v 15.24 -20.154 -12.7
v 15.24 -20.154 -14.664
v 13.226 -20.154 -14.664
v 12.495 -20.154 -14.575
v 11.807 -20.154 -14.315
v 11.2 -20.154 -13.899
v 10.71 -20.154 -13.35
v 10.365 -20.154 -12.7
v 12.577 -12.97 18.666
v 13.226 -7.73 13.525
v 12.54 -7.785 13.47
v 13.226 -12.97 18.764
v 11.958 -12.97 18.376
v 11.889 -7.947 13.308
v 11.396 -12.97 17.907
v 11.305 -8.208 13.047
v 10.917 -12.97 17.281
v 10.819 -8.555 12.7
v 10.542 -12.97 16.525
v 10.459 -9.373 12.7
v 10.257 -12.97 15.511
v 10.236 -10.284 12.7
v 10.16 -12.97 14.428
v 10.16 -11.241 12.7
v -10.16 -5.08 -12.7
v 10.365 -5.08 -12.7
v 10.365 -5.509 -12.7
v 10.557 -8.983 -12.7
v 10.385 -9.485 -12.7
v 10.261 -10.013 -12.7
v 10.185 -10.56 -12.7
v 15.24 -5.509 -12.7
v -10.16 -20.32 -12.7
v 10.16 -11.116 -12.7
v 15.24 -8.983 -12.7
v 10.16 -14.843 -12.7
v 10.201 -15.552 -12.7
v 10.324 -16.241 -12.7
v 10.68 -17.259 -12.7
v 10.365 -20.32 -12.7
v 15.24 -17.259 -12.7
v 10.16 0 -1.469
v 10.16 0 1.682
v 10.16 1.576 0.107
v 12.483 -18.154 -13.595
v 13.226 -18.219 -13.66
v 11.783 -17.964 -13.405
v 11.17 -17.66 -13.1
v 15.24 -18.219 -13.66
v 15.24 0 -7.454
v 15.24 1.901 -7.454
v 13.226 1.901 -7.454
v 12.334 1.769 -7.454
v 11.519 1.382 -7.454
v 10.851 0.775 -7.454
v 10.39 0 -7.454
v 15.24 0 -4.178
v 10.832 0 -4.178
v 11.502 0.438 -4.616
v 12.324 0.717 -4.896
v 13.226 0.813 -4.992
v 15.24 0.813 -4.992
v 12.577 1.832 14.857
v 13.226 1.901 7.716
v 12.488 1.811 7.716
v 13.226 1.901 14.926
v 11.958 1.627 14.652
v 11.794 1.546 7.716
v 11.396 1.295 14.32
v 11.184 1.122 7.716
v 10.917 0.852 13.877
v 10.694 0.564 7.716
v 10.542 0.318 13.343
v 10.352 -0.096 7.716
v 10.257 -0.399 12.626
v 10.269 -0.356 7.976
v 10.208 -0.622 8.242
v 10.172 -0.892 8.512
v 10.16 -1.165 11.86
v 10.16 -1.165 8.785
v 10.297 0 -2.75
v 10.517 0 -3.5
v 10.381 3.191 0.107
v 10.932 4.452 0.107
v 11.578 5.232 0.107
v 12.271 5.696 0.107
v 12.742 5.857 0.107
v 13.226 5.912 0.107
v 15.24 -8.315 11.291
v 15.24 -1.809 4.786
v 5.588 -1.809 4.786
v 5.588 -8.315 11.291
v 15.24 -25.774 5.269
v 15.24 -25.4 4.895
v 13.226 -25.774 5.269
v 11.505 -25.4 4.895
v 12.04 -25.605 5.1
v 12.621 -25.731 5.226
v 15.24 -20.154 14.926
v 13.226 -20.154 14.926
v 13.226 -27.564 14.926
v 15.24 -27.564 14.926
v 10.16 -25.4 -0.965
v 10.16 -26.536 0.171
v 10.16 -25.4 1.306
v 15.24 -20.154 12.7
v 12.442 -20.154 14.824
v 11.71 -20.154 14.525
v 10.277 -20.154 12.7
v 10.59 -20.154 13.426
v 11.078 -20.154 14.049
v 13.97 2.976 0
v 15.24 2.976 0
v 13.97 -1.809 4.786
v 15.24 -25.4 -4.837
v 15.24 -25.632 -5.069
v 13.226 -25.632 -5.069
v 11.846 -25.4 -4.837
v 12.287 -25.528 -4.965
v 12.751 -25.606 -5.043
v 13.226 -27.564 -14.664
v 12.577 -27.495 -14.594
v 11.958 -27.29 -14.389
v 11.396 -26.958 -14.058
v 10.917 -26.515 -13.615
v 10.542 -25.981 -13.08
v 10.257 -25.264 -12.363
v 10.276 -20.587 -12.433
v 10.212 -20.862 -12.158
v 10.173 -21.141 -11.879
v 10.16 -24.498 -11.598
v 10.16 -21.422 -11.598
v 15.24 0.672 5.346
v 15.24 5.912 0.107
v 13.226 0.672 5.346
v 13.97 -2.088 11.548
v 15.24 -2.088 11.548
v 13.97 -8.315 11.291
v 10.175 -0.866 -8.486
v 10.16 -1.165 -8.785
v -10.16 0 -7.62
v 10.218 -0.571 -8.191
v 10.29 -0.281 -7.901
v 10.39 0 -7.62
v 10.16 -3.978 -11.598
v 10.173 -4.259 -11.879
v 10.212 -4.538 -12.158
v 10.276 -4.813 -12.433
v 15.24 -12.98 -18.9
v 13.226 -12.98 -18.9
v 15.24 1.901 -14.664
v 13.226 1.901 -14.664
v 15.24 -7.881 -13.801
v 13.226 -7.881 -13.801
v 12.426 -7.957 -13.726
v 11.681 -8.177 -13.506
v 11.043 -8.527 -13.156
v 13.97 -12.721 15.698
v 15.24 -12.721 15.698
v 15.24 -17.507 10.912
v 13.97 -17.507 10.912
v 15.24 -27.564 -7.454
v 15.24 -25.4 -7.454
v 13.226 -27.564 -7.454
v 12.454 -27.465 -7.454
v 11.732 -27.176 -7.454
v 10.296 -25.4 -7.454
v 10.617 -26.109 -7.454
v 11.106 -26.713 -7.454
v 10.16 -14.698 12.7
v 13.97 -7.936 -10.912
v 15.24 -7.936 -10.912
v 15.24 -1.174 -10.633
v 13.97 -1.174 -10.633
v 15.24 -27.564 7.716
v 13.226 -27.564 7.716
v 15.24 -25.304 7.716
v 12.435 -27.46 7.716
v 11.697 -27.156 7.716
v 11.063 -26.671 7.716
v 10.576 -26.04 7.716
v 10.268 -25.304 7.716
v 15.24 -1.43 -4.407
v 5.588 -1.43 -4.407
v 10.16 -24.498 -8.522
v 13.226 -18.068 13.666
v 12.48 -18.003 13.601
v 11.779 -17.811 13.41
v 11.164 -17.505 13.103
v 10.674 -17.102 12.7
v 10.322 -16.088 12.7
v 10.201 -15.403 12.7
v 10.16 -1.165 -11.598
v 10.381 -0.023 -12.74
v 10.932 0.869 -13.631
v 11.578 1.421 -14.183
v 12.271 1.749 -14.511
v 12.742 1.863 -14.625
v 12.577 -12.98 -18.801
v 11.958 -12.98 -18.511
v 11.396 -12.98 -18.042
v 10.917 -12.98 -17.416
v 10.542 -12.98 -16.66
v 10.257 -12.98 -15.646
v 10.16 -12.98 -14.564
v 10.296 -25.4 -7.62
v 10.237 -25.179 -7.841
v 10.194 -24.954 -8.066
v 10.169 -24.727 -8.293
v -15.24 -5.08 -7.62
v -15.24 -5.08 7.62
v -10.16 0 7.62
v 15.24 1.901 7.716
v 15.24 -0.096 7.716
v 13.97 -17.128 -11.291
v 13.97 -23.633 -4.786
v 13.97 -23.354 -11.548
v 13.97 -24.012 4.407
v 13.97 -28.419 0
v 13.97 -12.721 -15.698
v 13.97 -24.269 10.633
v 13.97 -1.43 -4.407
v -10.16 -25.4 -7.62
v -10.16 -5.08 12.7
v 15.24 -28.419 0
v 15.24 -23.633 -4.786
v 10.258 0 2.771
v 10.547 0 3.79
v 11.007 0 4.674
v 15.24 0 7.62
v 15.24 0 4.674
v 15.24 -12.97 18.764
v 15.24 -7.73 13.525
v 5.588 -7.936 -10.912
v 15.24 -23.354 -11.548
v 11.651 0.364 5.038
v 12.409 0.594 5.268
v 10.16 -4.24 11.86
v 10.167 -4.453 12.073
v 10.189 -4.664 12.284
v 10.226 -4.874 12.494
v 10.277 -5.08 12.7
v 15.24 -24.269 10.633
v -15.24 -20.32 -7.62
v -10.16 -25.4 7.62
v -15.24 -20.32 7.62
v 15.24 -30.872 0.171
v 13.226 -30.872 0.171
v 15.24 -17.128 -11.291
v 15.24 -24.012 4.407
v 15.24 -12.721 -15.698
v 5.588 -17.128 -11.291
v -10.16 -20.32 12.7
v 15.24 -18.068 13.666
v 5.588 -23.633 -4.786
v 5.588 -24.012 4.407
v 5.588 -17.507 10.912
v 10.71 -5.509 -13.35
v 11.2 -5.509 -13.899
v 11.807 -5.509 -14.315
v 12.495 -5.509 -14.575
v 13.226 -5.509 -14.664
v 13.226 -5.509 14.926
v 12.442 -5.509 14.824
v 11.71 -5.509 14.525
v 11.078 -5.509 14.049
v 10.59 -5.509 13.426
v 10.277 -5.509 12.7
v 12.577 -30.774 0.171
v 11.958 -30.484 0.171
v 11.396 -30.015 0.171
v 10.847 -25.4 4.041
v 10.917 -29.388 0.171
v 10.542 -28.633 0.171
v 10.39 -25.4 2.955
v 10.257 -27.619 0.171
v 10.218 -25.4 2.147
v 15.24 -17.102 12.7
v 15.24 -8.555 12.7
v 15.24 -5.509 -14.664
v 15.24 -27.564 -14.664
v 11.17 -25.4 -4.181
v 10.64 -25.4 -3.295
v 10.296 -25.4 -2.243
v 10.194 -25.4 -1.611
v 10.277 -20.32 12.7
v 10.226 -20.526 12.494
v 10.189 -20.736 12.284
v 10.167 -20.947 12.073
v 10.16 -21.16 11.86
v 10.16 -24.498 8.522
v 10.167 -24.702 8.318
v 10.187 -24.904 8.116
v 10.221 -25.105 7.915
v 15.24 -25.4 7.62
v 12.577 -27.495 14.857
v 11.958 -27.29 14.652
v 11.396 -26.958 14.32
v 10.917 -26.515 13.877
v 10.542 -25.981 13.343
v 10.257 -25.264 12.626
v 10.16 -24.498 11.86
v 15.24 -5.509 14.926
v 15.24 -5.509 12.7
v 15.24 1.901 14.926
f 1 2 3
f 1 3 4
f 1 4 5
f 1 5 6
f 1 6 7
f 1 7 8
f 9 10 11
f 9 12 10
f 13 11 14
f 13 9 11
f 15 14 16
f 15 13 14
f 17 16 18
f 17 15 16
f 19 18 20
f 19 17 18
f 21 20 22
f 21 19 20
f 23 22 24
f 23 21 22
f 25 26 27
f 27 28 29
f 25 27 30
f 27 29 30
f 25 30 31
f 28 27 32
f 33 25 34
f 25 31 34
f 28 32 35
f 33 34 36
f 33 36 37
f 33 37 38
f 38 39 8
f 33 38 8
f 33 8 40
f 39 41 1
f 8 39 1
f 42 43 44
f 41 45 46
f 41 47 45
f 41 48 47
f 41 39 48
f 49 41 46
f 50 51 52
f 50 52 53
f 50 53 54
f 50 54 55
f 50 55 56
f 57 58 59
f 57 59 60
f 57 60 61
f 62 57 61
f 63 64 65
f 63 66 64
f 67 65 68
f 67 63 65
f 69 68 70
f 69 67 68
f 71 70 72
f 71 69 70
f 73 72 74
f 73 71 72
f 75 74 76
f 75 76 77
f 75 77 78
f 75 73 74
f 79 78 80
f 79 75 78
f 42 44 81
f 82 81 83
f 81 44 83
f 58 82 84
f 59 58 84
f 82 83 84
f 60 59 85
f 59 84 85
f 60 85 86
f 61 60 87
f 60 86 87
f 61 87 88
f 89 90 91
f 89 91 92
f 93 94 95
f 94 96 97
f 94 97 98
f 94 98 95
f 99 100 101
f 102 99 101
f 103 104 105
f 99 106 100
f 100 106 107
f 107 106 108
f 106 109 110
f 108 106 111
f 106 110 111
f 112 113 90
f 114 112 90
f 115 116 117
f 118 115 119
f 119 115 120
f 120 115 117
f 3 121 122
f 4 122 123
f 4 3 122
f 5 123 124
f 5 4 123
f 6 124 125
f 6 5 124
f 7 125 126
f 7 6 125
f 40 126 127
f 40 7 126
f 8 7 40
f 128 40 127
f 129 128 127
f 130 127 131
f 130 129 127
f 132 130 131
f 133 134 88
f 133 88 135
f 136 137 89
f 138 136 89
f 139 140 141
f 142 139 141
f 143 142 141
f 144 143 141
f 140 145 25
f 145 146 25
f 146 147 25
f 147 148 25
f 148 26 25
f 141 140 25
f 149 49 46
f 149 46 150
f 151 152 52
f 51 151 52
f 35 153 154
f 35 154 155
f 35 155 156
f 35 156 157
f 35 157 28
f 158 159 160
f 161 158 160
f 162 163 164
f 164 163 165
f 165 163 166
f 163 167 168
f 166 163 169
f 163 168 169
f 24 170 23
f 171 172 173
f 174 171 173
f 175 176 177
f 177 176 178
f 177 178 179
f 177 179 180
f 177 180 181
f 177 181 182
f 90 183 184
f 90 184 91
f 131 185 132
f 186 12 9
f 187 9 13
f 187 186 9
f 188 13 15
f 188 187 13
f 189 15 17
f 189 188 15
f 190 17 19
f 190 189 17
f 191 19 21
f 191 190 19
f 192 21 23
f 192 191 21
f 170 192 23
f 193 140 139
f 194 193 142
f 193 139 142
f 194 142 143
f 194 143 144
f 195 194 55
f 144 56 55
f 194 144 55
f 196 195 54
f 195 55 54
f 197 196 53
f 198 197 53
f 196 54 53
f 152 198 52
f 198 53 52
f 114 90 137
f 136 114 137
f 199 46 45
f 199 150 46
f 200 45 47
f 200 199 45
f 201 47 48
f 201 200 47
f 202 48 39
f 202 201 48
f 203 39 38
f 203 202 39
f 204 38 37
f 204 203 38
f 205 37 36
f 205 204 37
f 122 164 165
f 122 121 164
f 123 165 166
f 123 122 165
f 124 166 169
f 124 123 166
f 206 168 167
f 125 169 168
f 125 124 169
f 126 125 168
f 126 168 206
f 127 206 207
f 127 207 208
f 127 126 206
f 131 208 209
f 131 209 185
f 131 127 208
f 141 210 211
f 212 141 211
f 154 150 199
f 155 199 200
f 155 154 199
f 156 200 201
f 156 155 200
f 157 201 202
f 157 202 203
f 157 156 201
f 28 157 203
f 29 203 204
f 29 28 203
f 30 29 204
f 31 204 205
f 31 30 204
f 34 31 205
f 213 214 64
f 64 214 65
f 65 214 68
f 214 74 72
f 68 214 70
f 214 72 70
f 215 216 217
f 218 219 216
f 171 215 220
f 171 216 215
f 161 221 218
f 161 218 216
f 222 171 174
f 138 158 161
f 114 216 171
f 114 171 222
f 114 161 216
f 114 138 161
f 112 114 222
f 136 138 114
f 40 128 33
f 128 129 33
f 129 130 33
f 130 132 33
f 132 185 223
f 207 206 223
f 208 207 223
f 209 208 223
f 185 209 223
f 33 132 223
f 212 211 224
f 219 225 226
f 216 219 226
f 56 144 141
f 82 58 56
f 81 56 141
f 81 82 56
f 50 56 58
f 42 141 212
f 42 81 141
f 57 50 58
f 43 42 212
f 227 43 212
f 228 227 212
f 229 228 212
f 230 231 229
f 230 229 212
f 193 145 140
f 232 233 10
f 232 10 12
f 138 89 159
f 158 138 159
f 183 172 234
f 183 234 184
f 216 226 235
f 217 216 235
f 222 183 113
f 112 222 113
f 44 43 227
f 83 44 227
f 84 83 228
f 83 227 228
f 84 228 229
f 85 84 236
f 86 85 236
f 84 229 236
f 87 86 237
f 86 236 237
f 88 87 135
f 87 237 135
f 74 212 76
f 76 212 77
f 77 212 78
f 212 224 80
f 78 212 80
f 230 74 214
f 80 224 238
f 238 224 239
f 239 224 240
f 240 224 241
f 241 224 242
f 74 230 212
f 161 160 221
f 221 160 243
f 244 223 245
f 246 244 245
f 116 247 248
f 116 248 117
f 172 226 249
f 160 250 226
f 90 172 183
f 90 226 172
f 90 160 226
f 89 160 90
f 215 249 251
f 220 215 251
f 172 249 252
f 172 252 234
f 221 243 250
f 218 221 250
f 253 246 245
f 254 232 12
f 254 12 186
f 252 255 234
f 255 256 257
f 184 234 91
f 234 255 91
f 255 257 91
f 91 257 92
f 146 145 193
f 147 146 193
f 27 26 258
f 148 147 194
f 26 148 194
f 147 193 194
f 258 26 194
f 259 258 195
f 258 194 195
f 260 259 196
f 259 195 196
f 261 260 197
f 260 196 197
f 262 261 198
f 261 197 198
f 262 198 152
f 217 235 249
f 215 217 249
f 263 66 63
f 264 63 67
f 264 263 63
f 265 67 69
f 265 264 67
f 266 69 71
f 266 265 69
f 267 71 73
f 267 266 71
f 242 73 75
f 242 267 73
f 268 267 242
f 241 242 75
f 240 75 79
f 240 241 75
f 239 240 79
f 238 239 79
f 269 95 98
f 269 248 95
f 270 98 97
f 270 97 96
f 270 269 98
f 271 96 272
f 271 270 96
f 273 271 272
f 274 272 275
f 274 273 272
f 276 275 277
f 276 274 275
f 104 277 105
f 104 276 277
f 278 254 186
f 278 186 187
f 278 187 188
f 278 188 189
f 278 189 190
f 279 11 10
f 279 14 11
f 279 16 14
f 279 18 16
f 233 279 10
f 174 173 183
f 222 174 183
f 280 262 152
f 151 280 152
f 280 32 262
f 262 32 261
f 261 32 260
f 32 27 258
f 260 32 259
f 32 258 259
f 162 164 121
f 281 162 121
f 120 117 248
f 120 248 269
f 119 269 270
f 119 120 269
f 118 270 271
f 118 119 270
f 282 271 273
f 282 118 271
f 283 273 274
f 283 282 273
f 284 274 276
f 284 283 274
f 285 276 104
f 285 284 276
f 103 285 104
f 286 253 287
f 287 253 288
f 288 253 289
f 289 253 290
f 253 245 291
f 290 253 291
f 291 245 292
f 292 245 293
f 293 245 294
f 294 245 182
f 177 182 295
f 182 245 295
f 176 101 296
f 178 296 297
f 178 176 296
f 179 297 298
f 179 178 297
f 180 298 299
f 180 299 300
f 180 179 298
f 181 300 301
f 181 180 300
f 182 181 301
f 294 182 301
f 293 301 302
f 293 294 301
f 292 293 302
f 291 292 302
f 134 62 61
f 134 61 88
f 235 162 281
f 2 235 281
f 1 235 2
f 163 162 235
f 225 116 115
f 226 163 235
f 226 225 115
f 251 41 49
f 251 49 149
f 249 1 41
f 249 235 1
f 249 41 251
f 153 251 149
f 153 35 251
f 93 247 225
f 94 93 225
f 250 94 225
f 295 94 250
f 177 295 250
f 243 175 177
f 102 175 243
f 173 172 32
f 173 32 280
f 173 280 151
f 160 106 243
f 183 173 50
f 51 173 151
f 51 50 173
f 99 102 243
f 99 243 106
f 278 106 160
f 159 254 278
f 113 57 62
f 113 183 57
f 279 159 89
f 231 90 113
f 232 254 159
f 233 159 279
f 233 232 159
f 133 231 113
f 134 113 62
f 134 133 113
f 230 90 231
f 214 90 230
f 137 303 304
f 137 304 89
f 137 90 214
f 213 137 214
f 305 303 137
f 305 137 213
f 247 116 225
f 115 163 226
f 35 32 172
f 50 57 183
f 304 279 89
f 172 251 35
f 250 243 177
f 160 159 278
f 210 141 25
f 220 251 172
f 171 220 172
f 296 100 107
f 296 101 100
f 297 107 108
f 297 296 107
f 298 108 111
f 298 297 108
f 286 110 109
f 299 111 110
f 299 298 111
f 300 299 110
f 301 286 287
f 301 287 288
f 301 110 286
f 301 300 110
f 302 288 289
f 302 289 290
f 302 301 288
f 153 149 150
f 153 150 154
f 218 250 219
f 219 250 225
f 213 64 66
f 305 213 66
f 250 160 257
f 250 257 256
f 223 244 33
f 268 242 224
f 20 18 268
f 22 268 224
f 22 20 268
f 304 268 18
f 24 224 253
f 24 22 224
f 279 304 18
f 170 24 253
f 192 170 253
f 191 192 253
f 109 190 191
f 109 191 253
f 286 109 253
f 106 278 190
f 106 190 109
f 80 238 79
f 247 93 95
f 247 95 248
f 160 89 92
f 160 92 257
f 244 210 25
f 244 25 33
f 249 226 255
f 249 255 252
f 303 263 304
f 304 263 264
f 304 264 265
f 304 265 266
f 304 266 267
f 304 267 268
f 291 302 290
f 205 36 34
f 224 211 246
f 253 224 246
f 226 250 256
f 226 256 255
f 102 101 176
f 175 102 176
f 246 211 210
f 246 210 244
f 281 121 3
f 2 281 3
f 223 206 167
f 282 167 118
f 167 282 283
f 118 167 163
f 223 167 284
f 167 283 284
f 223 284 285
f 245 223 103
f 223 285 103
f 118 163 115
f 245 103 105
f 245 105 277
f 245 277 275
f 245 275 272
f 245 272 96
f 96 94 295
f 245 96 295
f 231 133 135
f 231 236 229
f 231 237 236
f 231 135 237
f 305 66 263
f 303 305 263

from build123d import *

# Parameters (mm, degrees)
F0_W       = 25.4
F0_H       = 25.4
F1_DEPTH   = 25.4
F2_W       = 5.2458834782
F2_H       = 4.983584857
F2_W_2     = 5.5085764325
F2_H_2     = 5.2462833226
F1_FACE_W  = 25.4
F1_FACE_H  = 25.4
F1_FACE1_W = 25.4
F1_FACE1_H = 25.4
F3_DEPTH   = 2.54
F5_DEPTH   = 5.08
F6_SIZE    = 5.08
F7_R       = 3.0660512242
F9_DEPTH   = 1.27
F10_DEPTH  = 9.652


# Not quite as in the source:
# - a feature names something its author has since deleted; it is built from what else it names


with BuildPart() as f1:
    # F0 (on Front) → F1 (new body)
    with BuildSketch(Plane.XZ):
        Rectangle(F0_W, F0_H)
    extrude(amount=F1_DEPTH)

    # F2 (on face) + F1_face (on face) + F1_face1 (on face) → F3 (join, symmetric)
    with BuildSketch(Plane.YZ.offset(12.7)):
        Polygon((-27.5641178384, 14.9262829959), (-27.5641178384, 7.716415143), (-25.4, 7.716415143), (-25.4, 12.7), (-20.1541165218, 12.7), (-20.1541165218, 14.9262829959), align=None)
        with Locations((-22.7770582609, 10.2082075715)):
            Rectangle(F2_W, F2_H)
        with Locations((-2.7542882162, 10.2082075715)):
            Rectangle(F2_W_2, F2_H)
        Polygon((-5.5085764325, 14.9262829959), (-5.5085764325, 12.7), (0, 12.7), (0, 7.716415143), (1.9014248842, 7.716415143), (1.9014248842, 14.9262829959), align=None)
        Polygon((0, -12.7), (-5.5085764325, -12.7), (-5.5085764325, -14.6635845304), (1.9014248842, -14.6635845304), (1.9014248842, -7.4537166774), (0, -7.4537166774), align=None)
        Polygon((-25.4, -12.7), (-25.4, -7.4537166774), (-27.5641178384, -7.4537166774), (-27.5641178384, -14.6635845304), (-20.1541165218, -14.6635845304), (-20.1541165218, -12.7), align=None)
        with Locations((-2.7542882162, -10.0768583387)):
            Rectangle(F2_W_2, F2_H_2)
    with BuildSketch(Plane(origin=(12.7, -12.7, 0), x_dir=(0, 1, 0), z_dir=(1, 0, 0))):
        Rectangle(F1_FACE_W, F1_FACE_H)
    with BuildSketch(Plane(origin=(-12.7, -12.7, 0), x_dir=(0, -1, 0), z_dir=(-1, 0, 0))):
        Rectangle(F1_FACE1_W, F1_FACE1_H)
    extrude(amount=F3_DEPTH, both=True, dir=(1, 0, 0))

    # F4 (on face) → F5 (join)
    with BuildSketch(Plane.YZ.offset(15.24)):
        Polygon((-12.9697233272, 18.7644396144), (-18.0678697774, 13.6662931641), (-17.1015766133, 12.7), (-8.5548385823, 12.7), (-7.7300611476, 13.5247774348), align=None)
        Polygon((0.6718987712, 5.3462631056), (0, 4.6743643344), (0, -4.1781310237), (0.8134145006, -4.9915455243), (5.9115609509, 0.106600926), align=None)
        Polygon((-8.9828089794, -12.7), (-17.2593100241, -12.7), (-18.219205952, -13.6598959279), (-12.9795437724, -18.8995581075), (-7.8813973221, -13.8014116573), align=None)
        Polygon((-25.4, -4.8368342047), (-25.4, 4.8952218766), (-25.773634139, 5.2688560155), (-30.8717805892, 0.1707095653), (-25.6321184096, -5.0689526143), align=None)
    extrude(amount=-F5_DEPTH)

    # F6
    f6_edges = [f1.edges().sort_by_distance(p)[0] for p in [
        (-2.54, 0, -12.7),
        (-15.24, 0, 0),
        (-15.24, -12.7, 12.7),
        (-15.24, -12.7, -12.7),
        (-15.24, -25.4, 0),
        (-2.54, -25.4, 12.7),
        (-2.54, -25.4, -12.7),
        (-2.54, 0, 12.7),
    ]]
    chamfer(f6_edges, length=F6_SIZE)

    # F7
    f7_edges = [f1.edges().sort_by_distance(p)[0] for p in [
        (10.16, -15.599375, -16.279727),
        (10.16, -10.430471, -16.350485),
        (10.16, -1.803576, -14.663585),
        (10.16, 1.901425, -11.058651),
        (10.16, -23.859117, -14.663585),
        (10.16, -27.564118, -11.058651),
        (10.16, -28.251949, -2.449122),
        (10.16, -28.322707, 2.719783),
        (10.16, -27.564118, 11.321349),
        (10.16, -23.859117, 14.926283),
        (10.16, 3.362488, -2.442472),
        (10.16, 3.29173, 2.726432),
        (10.16, 1.901425, 11.321349),
        (10.16, -1.803576, 14.926283),
        (10.16, -10.349892, 16.144609),
        (10.16, -15.518797, 16.215366),
    ]]
    fillet(f7_edges, radius=F7_R)

    # F8 (on face) → F9 (cut)
    with BuildSketch(Plane.YZ.offset(15.24)):
        Polygon((-1.4303888491, -4.4065409636), (2.9761521146, 0), (-1.8094554409, 4.7856075555), align=None)
        Polygon((-1.1736200056, -10.6330388789), (-1.4303888491, -4.4065409636), (-7.9357437924, -10.911895907), align=None)
        Polygon((-7.9357437924, -10.911895907), (-1.4303888491, -4.4065409636), (-1.8094554409, 4.7856075555), (-8.3148103842, 11.2909624988), (-17.5069589033, 10.911895907), (-24.0123138467, 4.4065409636), (-23.6332472548, -4.7856075555), (-17.1278923115, -11.2909624988), align=None)
        Polygon((-8.3148103842, 11.2909624988), (-1.8094554409, 4.7856075555), (-2.0883124689, 11.5477313422), align=None)
        Polygon((-12.7213513479, -15.6975034624), (-7.9357437924, -10.911895907), (-17.1278923115, -11.2909624988), align=None)
        Polygon((-17.5069589033, 10.911895907), (-8.3148103842, 11.2909624988), (-12.7213513479, 15.6975034624), align=None)
        Polygon((-23.3543902268, -11.5477313422), (-17.1278923115, -11.2909624988), (-23.6332472548, -4.7856075555), align=None)
        Polygon((-24.0123138467, 4.4065409636), (-17.5069589033, 10.911895907), (-24.2690826901, 10.6330388789), align=None)
        Polygon((-28.4188548103, 0), (-23.6332472548, -4.7856075555), (-24.0123138467, 4.4065409636), align=None)
    extrude(amount=-F9_DEPTH, mode=Mode.SUBTRACT)


with BuildPart() as f10:
    # F8 (on face) → F10 (new body)
    with BuildSketch(Plane.YZ.offset(15.24)):
        Polygon((-7.9357437924, -10.911895907), (-1.4303888491, -4.4065409636), (-1.8094554409, 4.7856075555), (-8.3148103842, 11.2909624988), (-17.5069589033, 10.911895907), (-24.0123138467, 4.4065409636), (-23.6332472548, -4.7856075555), (-17.1278923115, -11.2909624988), align=None)
    extrude(amount=-F10_DEPTH)


solid = Compound([f1.part, f10.part])
